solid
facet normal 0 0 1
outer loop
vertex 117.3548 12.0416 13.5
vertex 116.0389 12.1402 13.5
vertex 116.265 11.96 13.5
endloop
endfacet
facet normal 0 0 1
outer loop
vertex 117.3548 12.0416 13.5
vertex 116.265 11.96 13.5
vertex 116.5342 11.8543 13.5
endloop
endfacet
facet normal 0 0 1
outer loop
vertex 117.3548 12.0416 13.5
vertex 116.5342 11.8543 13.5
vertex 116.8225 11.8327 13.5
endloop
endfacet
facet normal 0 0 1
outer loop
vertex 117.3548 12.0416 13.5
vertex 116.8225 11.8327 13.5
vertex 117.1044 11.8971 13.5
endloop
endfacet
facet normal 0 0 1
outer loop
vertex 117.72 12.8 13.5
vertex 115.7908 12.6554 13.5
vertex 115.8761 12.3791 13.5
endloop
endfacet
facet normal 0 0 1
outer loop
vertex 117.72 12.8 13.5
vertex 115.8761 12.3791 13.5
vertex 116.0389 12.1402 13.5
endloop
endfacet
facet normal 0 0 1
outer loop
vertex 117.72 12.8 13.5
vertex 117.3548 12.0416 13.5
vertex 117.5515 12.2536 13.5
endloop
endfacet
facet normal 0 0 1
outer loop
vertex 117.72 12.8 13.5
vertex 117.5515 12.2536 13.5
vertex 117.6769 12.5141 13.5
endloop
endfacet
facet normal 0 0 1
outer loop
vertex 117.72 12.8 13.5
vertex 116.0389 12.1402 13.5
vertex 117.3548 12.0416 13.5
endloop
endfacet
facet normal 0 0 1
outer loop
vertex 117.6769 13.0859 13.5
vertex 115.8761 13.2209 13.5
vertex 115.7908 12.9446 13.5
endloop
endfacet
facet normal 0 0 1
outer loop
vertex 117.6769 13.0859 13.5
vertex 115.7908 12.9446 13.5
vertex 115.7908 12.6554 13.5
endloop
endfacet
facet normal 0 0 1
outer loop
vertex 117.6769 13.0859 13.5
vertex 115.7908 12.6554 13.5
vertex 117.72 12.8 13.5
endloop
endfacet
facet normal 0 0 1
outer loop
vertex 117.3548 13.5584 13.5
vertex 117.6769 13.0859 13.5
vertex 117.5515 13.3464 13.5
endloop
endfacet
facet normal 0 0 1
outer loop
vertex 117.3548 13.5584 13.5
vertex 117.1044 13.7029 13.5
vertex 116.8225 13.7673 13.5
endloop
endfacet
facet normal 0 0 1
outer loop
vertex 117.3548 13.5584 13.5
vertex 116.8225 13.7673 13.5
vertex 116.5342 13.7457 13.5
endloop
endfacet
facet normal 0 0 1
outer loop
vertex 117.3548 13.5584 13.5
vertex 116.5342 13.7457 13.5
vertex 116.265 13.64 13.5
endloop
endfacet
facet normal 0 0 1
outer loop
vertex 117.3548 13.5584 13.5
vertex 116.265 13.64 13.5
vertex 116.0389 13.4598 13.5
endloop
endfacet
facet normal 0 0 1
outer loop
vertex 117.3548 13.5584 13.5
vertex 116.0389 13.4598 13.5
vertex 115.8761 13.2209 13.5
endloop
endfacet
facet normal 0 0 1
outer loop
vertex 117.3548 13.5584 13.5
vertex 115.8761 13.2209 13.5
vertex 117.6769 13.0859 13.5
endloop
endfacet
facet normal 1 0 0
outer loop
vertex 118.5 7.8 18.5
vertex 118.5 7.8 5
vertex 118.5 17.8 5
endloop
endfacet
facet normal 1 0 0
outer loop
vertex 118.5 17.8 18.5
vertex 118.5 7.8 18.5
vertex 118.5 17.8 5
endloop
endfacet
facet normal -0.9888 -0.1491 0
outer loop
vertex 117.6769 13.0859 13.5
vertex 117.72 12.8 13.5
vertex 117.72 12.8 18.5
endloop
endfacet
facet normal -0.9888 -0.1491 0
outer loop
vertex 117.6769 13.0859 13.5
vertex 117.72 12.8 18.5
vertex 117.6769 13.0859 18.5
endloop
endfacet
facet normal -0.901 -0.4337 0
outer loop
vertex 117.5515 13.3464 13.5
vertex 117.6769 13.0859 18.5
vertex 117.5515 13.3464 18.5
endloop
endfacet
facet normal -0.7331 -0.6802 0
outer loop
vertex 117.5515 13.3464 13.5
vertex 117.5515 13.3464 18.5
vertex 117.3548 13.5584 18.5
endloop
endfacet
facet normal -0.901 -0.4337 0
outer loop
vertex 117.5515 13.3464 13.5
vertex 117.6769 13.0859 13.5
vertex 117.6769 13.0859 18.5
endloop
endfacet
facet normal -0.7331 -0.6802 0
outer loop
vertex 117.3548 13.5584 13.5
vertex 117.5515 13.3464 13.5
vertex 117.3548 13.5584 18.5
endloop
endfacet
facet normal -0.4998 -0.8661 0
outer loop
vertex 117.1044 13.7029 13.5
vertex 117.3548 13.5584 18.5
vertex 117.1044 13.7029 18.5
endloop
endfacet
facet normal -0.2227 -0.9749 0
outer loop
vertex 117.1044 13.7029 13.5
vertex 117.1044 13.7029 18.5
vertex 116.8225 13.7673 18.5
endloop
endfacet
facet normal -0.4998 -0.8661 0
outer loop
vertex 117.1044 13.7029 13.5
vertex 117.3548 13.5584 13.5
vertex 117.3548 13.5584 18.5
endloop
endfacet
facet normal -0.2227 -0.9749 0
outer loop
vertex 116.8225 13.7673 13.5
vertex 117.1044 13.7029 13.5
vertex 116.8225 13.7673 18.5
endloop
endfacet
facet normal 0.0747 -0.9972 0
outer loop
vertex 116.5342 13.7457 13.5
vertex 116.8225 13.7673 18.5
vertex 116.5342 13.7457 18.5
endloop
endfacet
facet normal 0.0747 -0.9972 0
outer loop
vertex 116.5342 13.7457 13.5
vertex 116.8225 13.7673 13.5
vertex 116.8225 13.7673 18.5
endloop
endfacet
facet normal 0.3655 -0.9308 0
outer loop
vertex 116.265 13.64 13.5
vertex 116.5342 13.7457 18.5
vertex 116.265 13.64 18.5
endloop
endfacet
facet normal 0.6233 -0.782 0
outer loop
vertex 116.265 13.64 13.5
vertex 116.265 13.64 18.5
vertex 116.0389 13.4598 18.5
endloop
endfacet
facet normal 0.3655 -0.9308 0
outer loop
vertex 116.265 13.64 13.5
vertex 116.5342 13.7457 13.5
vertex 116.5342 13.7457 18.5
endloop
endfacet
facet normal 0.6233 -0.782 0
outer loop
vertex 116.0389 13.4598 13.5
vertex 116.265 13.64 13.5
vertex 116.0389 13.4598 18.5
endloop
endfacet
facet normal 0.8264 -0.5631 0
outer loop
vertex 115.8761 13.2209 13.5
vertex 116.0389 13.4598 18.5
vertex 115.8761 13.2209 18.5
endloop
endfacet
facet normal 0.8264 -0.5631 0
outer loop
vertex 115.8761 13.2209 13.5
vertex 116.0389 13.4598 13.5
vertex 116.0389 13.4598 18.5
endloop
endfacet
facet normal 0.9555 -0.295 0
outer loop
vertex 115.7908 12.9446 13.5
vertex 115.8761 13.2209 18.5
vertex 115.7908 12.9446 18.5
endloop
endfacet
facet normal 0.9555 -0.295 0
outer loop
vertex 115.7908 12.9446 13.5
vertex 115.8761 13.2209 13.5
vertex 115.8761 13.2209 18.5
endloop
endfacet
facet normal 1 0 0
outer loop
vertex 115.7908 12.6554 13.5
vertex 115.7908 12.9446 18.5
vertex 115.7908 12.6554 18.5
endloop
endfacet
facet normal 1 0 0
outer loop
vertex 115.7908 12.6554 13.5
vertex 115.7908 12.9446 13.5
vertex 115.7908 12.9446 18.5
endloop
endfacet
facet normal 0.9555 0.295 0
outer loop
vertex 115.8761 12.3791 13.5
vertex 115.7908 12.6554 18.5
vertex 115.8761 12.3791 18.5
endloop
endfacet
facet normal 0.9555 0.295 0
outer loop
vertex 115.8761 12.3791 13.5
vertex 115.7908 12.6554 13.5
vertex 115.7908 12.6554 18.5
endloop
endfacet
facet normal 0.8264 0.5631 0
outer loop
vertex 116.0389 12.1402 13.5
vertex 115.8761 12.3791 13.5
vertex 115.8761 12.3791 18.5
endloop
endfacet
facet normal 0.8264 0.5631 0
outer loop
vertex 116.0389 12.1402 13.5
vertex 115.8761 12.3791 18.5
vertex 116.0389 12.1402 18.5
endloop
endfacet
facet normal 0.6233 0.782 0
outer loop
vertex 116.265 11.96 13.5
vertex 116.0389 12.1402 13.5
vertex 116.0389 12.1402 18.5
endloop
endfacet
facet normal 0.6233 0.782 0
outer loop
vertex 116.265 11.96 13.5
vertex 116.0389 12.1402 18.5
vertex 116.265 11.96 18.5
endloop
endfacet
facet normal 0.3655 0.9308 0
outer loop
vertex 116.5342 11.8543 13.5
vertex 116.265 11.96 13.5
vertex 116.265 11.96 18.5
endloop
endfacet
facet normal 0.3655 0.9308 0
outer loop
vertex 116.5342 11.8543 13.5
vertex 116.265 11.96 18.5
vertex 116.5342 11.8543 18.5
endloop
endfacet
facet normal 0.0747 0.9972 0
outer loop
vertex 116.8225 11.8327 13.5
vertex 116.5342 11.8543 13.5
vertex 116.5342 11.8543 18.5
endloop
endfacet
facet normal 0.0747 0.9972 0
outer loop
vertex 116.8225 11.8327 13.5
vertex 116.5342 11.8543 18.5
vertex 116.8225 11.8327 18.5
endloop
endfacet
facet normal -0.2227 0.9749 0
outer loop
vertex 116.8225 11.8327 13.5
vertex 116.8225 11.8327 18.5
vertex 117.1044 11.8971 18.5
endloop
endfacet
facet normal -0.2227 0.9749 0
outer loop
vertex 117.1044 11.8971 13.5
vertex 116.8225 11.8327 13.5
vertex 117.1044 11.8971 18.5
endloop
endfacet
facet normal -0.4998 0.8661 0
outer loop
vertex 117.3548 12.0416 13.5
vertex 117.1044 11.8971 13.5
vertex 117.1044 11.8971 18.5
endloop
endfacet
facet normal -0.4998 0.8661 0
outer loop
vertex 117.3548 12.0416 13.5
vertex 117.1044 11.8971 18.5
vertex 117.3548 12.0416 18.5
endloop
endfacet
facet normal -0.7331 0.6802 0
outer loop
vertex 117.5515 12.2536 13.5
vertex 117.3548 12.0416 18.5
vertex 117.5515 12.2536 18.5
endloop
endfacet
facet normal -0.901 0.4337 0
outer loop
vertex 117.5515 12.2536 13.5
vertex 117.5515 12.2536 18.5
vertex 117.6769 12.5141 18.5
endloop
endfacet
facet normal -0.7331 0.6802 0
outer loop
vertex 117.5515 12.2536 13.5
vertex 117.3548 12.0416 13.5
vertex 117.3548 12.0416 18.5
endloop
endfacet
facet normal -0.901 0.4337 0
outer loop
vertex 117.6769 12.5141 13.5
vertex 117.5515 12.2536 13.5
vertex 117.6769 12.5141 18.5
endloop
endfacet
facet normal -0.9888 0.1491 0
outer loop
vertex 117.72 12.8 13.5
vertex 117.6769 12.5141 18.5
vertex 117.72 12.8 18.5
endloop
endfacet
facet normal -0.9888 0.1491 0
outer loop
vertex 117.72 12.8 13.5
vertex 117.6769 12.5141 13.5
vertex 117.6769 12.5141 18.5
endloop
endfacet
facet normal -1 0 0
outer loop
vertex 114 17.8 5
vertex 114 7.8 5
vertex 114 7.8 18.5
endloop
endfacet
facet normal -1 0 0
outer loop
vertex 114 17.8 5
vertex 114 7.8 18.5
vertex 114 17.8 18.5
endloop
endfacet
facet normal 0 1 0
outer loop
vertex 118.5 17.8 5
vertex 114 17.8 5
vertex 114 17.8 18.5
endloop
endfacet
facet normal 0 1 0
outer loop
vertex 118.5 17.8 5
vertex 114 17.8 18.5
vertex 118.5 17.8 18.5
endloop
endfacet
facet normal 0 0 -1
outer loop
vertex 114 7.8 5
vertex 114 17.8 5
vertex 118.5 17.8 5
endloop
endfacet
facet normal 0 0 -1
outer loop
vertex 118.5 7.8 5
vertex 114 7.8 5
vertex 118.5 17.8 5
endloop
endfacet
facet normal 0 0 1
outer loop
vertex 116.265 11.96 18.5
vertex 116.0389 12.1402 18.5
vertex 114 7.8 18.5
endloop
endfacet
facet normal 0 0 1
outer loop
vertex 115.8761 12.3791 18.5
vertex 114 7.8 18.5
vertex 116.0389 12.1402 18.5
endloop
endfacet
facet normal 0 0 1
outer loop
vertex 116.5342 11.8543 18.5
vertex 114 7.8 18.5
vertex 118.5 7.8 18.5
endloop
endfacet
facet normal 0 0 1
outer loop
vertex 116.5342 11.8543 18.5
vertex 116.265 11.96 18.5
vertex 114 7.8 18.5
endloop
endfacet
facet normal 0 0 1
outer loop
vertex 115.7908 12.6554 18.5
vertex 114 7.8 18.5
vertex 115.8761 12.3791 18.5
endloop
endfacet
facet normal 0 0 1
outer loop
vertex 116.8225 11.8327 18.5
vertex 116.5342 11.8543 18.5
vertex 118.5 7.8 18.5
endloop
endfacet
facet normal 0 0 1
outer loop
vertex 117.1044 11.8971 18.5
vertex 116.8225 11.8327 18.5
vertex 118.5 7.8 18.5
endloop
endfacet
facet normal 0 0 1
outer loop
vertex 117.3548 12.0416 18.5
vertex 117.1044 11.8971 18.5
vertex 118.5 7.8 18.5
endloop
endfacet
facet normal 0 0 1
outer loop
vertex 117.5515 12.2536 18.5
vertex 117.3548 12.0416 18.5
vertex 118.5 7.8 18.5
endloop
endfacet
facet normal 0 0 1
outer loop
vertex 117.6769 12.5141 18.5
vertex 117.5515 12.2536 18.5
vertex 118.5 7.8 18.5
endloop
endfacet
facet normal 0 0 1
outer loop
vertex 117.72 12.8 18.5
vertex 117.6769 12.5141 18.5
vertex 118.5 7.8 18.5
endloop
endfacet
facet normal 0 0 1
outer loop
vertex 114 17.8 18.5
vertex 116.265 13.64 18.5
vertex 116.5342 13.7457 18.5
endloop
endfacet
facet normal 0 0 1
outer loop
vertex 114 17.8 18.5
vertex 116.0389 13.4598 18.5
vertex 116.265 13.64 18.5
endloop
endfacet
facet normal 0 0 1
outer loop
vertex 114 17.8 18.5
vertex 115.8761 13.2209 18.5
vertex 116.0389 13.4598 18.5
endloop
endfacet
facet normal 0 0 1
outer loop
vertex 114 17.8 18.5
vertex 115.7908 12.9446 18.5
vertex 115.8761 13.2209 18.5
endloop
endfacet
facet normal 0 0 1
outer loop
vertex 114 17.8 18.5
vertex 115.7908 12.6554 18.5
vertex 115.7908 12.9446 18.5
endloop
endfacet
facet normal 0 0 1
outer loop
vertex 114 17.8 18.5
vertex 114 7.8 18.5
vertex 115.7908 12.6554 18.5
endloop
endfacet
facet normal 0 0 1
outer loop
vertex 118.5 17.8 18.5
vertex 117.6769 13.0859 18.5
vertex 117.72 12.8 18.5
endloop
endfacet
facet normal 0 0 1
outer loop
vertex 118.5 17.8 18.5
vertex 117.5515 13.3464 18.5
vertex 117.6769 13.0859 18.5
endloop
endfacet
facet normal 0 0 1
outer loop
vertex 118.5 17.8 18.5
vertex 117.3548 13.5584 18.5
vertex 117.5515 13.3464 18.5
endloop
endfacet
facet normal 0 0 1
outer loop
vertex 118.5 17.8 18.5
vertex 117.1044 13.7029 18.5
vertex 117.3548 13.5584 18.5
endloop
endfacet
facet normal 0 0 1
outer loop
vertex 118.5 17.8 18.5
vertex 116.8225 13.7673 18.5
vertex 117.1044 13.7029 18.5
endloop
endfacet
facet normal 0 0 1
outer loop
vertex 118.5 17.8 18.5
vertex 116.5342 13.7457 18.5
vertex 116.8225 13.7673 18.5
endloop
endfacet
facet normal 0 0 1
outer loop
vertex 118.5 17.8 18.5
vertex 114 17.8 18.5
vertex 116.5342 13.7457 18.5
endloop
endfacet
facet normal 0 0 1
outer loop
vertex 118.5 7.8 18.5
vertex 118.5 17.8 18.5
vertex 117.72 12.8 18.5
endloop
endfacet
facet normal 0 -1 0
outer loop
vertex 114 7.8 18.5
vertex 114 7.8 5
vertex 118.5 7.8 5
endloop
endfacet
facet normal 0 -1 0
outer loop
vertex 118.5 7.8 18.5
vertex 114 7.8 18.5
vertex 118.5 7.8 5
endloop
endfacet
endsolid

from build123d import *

# Parameters (mm, degrees)
CYLINDER002002001001001001001001007_R     = 0.97
CYLINDER002002001001001001001001007_DEPTH = 5
BOX006001_W                               = 4.5
BOX006001_H                               = 10
BOX006001_DEPTH                           = 13.5


with BuildPart() as cylinder002002001001001001001001007:
    # Cylinder002002001001001001001001007 → Cylinder002002001001001001001001007 (new body)
    with BuildSketch(Plane(origin=(116.75, 12.8, 13.5), x_dir=(1, 0, 0), z_dir=(0, 0, 1))):
        Circle(CYLINDER002002001001001001001001007_R)
    extrude(amount=CYLINDER002002001001001001001001007_DEPTH)


with BuildPart() as cut013003022:
    # Box006001 → Box006001 (new body)
    with BuildSketch(Plane(origin=(114, 7.8, 5), x_dir=(1, 0, 0), z_dir=(0, 0, 1))):
        with Locations((2.25, 5)):
            Rectangle(BOX006001_W, BOX006001_H)
    extrude(amount=BOX006001_DEPTH)

    # Cut013003022: cut Cylinder002002001001001001001001007
    add(cylinder002002001001001001001001007.part, mode=Mode.SUBTRACT)


solid = cut013003022.part
